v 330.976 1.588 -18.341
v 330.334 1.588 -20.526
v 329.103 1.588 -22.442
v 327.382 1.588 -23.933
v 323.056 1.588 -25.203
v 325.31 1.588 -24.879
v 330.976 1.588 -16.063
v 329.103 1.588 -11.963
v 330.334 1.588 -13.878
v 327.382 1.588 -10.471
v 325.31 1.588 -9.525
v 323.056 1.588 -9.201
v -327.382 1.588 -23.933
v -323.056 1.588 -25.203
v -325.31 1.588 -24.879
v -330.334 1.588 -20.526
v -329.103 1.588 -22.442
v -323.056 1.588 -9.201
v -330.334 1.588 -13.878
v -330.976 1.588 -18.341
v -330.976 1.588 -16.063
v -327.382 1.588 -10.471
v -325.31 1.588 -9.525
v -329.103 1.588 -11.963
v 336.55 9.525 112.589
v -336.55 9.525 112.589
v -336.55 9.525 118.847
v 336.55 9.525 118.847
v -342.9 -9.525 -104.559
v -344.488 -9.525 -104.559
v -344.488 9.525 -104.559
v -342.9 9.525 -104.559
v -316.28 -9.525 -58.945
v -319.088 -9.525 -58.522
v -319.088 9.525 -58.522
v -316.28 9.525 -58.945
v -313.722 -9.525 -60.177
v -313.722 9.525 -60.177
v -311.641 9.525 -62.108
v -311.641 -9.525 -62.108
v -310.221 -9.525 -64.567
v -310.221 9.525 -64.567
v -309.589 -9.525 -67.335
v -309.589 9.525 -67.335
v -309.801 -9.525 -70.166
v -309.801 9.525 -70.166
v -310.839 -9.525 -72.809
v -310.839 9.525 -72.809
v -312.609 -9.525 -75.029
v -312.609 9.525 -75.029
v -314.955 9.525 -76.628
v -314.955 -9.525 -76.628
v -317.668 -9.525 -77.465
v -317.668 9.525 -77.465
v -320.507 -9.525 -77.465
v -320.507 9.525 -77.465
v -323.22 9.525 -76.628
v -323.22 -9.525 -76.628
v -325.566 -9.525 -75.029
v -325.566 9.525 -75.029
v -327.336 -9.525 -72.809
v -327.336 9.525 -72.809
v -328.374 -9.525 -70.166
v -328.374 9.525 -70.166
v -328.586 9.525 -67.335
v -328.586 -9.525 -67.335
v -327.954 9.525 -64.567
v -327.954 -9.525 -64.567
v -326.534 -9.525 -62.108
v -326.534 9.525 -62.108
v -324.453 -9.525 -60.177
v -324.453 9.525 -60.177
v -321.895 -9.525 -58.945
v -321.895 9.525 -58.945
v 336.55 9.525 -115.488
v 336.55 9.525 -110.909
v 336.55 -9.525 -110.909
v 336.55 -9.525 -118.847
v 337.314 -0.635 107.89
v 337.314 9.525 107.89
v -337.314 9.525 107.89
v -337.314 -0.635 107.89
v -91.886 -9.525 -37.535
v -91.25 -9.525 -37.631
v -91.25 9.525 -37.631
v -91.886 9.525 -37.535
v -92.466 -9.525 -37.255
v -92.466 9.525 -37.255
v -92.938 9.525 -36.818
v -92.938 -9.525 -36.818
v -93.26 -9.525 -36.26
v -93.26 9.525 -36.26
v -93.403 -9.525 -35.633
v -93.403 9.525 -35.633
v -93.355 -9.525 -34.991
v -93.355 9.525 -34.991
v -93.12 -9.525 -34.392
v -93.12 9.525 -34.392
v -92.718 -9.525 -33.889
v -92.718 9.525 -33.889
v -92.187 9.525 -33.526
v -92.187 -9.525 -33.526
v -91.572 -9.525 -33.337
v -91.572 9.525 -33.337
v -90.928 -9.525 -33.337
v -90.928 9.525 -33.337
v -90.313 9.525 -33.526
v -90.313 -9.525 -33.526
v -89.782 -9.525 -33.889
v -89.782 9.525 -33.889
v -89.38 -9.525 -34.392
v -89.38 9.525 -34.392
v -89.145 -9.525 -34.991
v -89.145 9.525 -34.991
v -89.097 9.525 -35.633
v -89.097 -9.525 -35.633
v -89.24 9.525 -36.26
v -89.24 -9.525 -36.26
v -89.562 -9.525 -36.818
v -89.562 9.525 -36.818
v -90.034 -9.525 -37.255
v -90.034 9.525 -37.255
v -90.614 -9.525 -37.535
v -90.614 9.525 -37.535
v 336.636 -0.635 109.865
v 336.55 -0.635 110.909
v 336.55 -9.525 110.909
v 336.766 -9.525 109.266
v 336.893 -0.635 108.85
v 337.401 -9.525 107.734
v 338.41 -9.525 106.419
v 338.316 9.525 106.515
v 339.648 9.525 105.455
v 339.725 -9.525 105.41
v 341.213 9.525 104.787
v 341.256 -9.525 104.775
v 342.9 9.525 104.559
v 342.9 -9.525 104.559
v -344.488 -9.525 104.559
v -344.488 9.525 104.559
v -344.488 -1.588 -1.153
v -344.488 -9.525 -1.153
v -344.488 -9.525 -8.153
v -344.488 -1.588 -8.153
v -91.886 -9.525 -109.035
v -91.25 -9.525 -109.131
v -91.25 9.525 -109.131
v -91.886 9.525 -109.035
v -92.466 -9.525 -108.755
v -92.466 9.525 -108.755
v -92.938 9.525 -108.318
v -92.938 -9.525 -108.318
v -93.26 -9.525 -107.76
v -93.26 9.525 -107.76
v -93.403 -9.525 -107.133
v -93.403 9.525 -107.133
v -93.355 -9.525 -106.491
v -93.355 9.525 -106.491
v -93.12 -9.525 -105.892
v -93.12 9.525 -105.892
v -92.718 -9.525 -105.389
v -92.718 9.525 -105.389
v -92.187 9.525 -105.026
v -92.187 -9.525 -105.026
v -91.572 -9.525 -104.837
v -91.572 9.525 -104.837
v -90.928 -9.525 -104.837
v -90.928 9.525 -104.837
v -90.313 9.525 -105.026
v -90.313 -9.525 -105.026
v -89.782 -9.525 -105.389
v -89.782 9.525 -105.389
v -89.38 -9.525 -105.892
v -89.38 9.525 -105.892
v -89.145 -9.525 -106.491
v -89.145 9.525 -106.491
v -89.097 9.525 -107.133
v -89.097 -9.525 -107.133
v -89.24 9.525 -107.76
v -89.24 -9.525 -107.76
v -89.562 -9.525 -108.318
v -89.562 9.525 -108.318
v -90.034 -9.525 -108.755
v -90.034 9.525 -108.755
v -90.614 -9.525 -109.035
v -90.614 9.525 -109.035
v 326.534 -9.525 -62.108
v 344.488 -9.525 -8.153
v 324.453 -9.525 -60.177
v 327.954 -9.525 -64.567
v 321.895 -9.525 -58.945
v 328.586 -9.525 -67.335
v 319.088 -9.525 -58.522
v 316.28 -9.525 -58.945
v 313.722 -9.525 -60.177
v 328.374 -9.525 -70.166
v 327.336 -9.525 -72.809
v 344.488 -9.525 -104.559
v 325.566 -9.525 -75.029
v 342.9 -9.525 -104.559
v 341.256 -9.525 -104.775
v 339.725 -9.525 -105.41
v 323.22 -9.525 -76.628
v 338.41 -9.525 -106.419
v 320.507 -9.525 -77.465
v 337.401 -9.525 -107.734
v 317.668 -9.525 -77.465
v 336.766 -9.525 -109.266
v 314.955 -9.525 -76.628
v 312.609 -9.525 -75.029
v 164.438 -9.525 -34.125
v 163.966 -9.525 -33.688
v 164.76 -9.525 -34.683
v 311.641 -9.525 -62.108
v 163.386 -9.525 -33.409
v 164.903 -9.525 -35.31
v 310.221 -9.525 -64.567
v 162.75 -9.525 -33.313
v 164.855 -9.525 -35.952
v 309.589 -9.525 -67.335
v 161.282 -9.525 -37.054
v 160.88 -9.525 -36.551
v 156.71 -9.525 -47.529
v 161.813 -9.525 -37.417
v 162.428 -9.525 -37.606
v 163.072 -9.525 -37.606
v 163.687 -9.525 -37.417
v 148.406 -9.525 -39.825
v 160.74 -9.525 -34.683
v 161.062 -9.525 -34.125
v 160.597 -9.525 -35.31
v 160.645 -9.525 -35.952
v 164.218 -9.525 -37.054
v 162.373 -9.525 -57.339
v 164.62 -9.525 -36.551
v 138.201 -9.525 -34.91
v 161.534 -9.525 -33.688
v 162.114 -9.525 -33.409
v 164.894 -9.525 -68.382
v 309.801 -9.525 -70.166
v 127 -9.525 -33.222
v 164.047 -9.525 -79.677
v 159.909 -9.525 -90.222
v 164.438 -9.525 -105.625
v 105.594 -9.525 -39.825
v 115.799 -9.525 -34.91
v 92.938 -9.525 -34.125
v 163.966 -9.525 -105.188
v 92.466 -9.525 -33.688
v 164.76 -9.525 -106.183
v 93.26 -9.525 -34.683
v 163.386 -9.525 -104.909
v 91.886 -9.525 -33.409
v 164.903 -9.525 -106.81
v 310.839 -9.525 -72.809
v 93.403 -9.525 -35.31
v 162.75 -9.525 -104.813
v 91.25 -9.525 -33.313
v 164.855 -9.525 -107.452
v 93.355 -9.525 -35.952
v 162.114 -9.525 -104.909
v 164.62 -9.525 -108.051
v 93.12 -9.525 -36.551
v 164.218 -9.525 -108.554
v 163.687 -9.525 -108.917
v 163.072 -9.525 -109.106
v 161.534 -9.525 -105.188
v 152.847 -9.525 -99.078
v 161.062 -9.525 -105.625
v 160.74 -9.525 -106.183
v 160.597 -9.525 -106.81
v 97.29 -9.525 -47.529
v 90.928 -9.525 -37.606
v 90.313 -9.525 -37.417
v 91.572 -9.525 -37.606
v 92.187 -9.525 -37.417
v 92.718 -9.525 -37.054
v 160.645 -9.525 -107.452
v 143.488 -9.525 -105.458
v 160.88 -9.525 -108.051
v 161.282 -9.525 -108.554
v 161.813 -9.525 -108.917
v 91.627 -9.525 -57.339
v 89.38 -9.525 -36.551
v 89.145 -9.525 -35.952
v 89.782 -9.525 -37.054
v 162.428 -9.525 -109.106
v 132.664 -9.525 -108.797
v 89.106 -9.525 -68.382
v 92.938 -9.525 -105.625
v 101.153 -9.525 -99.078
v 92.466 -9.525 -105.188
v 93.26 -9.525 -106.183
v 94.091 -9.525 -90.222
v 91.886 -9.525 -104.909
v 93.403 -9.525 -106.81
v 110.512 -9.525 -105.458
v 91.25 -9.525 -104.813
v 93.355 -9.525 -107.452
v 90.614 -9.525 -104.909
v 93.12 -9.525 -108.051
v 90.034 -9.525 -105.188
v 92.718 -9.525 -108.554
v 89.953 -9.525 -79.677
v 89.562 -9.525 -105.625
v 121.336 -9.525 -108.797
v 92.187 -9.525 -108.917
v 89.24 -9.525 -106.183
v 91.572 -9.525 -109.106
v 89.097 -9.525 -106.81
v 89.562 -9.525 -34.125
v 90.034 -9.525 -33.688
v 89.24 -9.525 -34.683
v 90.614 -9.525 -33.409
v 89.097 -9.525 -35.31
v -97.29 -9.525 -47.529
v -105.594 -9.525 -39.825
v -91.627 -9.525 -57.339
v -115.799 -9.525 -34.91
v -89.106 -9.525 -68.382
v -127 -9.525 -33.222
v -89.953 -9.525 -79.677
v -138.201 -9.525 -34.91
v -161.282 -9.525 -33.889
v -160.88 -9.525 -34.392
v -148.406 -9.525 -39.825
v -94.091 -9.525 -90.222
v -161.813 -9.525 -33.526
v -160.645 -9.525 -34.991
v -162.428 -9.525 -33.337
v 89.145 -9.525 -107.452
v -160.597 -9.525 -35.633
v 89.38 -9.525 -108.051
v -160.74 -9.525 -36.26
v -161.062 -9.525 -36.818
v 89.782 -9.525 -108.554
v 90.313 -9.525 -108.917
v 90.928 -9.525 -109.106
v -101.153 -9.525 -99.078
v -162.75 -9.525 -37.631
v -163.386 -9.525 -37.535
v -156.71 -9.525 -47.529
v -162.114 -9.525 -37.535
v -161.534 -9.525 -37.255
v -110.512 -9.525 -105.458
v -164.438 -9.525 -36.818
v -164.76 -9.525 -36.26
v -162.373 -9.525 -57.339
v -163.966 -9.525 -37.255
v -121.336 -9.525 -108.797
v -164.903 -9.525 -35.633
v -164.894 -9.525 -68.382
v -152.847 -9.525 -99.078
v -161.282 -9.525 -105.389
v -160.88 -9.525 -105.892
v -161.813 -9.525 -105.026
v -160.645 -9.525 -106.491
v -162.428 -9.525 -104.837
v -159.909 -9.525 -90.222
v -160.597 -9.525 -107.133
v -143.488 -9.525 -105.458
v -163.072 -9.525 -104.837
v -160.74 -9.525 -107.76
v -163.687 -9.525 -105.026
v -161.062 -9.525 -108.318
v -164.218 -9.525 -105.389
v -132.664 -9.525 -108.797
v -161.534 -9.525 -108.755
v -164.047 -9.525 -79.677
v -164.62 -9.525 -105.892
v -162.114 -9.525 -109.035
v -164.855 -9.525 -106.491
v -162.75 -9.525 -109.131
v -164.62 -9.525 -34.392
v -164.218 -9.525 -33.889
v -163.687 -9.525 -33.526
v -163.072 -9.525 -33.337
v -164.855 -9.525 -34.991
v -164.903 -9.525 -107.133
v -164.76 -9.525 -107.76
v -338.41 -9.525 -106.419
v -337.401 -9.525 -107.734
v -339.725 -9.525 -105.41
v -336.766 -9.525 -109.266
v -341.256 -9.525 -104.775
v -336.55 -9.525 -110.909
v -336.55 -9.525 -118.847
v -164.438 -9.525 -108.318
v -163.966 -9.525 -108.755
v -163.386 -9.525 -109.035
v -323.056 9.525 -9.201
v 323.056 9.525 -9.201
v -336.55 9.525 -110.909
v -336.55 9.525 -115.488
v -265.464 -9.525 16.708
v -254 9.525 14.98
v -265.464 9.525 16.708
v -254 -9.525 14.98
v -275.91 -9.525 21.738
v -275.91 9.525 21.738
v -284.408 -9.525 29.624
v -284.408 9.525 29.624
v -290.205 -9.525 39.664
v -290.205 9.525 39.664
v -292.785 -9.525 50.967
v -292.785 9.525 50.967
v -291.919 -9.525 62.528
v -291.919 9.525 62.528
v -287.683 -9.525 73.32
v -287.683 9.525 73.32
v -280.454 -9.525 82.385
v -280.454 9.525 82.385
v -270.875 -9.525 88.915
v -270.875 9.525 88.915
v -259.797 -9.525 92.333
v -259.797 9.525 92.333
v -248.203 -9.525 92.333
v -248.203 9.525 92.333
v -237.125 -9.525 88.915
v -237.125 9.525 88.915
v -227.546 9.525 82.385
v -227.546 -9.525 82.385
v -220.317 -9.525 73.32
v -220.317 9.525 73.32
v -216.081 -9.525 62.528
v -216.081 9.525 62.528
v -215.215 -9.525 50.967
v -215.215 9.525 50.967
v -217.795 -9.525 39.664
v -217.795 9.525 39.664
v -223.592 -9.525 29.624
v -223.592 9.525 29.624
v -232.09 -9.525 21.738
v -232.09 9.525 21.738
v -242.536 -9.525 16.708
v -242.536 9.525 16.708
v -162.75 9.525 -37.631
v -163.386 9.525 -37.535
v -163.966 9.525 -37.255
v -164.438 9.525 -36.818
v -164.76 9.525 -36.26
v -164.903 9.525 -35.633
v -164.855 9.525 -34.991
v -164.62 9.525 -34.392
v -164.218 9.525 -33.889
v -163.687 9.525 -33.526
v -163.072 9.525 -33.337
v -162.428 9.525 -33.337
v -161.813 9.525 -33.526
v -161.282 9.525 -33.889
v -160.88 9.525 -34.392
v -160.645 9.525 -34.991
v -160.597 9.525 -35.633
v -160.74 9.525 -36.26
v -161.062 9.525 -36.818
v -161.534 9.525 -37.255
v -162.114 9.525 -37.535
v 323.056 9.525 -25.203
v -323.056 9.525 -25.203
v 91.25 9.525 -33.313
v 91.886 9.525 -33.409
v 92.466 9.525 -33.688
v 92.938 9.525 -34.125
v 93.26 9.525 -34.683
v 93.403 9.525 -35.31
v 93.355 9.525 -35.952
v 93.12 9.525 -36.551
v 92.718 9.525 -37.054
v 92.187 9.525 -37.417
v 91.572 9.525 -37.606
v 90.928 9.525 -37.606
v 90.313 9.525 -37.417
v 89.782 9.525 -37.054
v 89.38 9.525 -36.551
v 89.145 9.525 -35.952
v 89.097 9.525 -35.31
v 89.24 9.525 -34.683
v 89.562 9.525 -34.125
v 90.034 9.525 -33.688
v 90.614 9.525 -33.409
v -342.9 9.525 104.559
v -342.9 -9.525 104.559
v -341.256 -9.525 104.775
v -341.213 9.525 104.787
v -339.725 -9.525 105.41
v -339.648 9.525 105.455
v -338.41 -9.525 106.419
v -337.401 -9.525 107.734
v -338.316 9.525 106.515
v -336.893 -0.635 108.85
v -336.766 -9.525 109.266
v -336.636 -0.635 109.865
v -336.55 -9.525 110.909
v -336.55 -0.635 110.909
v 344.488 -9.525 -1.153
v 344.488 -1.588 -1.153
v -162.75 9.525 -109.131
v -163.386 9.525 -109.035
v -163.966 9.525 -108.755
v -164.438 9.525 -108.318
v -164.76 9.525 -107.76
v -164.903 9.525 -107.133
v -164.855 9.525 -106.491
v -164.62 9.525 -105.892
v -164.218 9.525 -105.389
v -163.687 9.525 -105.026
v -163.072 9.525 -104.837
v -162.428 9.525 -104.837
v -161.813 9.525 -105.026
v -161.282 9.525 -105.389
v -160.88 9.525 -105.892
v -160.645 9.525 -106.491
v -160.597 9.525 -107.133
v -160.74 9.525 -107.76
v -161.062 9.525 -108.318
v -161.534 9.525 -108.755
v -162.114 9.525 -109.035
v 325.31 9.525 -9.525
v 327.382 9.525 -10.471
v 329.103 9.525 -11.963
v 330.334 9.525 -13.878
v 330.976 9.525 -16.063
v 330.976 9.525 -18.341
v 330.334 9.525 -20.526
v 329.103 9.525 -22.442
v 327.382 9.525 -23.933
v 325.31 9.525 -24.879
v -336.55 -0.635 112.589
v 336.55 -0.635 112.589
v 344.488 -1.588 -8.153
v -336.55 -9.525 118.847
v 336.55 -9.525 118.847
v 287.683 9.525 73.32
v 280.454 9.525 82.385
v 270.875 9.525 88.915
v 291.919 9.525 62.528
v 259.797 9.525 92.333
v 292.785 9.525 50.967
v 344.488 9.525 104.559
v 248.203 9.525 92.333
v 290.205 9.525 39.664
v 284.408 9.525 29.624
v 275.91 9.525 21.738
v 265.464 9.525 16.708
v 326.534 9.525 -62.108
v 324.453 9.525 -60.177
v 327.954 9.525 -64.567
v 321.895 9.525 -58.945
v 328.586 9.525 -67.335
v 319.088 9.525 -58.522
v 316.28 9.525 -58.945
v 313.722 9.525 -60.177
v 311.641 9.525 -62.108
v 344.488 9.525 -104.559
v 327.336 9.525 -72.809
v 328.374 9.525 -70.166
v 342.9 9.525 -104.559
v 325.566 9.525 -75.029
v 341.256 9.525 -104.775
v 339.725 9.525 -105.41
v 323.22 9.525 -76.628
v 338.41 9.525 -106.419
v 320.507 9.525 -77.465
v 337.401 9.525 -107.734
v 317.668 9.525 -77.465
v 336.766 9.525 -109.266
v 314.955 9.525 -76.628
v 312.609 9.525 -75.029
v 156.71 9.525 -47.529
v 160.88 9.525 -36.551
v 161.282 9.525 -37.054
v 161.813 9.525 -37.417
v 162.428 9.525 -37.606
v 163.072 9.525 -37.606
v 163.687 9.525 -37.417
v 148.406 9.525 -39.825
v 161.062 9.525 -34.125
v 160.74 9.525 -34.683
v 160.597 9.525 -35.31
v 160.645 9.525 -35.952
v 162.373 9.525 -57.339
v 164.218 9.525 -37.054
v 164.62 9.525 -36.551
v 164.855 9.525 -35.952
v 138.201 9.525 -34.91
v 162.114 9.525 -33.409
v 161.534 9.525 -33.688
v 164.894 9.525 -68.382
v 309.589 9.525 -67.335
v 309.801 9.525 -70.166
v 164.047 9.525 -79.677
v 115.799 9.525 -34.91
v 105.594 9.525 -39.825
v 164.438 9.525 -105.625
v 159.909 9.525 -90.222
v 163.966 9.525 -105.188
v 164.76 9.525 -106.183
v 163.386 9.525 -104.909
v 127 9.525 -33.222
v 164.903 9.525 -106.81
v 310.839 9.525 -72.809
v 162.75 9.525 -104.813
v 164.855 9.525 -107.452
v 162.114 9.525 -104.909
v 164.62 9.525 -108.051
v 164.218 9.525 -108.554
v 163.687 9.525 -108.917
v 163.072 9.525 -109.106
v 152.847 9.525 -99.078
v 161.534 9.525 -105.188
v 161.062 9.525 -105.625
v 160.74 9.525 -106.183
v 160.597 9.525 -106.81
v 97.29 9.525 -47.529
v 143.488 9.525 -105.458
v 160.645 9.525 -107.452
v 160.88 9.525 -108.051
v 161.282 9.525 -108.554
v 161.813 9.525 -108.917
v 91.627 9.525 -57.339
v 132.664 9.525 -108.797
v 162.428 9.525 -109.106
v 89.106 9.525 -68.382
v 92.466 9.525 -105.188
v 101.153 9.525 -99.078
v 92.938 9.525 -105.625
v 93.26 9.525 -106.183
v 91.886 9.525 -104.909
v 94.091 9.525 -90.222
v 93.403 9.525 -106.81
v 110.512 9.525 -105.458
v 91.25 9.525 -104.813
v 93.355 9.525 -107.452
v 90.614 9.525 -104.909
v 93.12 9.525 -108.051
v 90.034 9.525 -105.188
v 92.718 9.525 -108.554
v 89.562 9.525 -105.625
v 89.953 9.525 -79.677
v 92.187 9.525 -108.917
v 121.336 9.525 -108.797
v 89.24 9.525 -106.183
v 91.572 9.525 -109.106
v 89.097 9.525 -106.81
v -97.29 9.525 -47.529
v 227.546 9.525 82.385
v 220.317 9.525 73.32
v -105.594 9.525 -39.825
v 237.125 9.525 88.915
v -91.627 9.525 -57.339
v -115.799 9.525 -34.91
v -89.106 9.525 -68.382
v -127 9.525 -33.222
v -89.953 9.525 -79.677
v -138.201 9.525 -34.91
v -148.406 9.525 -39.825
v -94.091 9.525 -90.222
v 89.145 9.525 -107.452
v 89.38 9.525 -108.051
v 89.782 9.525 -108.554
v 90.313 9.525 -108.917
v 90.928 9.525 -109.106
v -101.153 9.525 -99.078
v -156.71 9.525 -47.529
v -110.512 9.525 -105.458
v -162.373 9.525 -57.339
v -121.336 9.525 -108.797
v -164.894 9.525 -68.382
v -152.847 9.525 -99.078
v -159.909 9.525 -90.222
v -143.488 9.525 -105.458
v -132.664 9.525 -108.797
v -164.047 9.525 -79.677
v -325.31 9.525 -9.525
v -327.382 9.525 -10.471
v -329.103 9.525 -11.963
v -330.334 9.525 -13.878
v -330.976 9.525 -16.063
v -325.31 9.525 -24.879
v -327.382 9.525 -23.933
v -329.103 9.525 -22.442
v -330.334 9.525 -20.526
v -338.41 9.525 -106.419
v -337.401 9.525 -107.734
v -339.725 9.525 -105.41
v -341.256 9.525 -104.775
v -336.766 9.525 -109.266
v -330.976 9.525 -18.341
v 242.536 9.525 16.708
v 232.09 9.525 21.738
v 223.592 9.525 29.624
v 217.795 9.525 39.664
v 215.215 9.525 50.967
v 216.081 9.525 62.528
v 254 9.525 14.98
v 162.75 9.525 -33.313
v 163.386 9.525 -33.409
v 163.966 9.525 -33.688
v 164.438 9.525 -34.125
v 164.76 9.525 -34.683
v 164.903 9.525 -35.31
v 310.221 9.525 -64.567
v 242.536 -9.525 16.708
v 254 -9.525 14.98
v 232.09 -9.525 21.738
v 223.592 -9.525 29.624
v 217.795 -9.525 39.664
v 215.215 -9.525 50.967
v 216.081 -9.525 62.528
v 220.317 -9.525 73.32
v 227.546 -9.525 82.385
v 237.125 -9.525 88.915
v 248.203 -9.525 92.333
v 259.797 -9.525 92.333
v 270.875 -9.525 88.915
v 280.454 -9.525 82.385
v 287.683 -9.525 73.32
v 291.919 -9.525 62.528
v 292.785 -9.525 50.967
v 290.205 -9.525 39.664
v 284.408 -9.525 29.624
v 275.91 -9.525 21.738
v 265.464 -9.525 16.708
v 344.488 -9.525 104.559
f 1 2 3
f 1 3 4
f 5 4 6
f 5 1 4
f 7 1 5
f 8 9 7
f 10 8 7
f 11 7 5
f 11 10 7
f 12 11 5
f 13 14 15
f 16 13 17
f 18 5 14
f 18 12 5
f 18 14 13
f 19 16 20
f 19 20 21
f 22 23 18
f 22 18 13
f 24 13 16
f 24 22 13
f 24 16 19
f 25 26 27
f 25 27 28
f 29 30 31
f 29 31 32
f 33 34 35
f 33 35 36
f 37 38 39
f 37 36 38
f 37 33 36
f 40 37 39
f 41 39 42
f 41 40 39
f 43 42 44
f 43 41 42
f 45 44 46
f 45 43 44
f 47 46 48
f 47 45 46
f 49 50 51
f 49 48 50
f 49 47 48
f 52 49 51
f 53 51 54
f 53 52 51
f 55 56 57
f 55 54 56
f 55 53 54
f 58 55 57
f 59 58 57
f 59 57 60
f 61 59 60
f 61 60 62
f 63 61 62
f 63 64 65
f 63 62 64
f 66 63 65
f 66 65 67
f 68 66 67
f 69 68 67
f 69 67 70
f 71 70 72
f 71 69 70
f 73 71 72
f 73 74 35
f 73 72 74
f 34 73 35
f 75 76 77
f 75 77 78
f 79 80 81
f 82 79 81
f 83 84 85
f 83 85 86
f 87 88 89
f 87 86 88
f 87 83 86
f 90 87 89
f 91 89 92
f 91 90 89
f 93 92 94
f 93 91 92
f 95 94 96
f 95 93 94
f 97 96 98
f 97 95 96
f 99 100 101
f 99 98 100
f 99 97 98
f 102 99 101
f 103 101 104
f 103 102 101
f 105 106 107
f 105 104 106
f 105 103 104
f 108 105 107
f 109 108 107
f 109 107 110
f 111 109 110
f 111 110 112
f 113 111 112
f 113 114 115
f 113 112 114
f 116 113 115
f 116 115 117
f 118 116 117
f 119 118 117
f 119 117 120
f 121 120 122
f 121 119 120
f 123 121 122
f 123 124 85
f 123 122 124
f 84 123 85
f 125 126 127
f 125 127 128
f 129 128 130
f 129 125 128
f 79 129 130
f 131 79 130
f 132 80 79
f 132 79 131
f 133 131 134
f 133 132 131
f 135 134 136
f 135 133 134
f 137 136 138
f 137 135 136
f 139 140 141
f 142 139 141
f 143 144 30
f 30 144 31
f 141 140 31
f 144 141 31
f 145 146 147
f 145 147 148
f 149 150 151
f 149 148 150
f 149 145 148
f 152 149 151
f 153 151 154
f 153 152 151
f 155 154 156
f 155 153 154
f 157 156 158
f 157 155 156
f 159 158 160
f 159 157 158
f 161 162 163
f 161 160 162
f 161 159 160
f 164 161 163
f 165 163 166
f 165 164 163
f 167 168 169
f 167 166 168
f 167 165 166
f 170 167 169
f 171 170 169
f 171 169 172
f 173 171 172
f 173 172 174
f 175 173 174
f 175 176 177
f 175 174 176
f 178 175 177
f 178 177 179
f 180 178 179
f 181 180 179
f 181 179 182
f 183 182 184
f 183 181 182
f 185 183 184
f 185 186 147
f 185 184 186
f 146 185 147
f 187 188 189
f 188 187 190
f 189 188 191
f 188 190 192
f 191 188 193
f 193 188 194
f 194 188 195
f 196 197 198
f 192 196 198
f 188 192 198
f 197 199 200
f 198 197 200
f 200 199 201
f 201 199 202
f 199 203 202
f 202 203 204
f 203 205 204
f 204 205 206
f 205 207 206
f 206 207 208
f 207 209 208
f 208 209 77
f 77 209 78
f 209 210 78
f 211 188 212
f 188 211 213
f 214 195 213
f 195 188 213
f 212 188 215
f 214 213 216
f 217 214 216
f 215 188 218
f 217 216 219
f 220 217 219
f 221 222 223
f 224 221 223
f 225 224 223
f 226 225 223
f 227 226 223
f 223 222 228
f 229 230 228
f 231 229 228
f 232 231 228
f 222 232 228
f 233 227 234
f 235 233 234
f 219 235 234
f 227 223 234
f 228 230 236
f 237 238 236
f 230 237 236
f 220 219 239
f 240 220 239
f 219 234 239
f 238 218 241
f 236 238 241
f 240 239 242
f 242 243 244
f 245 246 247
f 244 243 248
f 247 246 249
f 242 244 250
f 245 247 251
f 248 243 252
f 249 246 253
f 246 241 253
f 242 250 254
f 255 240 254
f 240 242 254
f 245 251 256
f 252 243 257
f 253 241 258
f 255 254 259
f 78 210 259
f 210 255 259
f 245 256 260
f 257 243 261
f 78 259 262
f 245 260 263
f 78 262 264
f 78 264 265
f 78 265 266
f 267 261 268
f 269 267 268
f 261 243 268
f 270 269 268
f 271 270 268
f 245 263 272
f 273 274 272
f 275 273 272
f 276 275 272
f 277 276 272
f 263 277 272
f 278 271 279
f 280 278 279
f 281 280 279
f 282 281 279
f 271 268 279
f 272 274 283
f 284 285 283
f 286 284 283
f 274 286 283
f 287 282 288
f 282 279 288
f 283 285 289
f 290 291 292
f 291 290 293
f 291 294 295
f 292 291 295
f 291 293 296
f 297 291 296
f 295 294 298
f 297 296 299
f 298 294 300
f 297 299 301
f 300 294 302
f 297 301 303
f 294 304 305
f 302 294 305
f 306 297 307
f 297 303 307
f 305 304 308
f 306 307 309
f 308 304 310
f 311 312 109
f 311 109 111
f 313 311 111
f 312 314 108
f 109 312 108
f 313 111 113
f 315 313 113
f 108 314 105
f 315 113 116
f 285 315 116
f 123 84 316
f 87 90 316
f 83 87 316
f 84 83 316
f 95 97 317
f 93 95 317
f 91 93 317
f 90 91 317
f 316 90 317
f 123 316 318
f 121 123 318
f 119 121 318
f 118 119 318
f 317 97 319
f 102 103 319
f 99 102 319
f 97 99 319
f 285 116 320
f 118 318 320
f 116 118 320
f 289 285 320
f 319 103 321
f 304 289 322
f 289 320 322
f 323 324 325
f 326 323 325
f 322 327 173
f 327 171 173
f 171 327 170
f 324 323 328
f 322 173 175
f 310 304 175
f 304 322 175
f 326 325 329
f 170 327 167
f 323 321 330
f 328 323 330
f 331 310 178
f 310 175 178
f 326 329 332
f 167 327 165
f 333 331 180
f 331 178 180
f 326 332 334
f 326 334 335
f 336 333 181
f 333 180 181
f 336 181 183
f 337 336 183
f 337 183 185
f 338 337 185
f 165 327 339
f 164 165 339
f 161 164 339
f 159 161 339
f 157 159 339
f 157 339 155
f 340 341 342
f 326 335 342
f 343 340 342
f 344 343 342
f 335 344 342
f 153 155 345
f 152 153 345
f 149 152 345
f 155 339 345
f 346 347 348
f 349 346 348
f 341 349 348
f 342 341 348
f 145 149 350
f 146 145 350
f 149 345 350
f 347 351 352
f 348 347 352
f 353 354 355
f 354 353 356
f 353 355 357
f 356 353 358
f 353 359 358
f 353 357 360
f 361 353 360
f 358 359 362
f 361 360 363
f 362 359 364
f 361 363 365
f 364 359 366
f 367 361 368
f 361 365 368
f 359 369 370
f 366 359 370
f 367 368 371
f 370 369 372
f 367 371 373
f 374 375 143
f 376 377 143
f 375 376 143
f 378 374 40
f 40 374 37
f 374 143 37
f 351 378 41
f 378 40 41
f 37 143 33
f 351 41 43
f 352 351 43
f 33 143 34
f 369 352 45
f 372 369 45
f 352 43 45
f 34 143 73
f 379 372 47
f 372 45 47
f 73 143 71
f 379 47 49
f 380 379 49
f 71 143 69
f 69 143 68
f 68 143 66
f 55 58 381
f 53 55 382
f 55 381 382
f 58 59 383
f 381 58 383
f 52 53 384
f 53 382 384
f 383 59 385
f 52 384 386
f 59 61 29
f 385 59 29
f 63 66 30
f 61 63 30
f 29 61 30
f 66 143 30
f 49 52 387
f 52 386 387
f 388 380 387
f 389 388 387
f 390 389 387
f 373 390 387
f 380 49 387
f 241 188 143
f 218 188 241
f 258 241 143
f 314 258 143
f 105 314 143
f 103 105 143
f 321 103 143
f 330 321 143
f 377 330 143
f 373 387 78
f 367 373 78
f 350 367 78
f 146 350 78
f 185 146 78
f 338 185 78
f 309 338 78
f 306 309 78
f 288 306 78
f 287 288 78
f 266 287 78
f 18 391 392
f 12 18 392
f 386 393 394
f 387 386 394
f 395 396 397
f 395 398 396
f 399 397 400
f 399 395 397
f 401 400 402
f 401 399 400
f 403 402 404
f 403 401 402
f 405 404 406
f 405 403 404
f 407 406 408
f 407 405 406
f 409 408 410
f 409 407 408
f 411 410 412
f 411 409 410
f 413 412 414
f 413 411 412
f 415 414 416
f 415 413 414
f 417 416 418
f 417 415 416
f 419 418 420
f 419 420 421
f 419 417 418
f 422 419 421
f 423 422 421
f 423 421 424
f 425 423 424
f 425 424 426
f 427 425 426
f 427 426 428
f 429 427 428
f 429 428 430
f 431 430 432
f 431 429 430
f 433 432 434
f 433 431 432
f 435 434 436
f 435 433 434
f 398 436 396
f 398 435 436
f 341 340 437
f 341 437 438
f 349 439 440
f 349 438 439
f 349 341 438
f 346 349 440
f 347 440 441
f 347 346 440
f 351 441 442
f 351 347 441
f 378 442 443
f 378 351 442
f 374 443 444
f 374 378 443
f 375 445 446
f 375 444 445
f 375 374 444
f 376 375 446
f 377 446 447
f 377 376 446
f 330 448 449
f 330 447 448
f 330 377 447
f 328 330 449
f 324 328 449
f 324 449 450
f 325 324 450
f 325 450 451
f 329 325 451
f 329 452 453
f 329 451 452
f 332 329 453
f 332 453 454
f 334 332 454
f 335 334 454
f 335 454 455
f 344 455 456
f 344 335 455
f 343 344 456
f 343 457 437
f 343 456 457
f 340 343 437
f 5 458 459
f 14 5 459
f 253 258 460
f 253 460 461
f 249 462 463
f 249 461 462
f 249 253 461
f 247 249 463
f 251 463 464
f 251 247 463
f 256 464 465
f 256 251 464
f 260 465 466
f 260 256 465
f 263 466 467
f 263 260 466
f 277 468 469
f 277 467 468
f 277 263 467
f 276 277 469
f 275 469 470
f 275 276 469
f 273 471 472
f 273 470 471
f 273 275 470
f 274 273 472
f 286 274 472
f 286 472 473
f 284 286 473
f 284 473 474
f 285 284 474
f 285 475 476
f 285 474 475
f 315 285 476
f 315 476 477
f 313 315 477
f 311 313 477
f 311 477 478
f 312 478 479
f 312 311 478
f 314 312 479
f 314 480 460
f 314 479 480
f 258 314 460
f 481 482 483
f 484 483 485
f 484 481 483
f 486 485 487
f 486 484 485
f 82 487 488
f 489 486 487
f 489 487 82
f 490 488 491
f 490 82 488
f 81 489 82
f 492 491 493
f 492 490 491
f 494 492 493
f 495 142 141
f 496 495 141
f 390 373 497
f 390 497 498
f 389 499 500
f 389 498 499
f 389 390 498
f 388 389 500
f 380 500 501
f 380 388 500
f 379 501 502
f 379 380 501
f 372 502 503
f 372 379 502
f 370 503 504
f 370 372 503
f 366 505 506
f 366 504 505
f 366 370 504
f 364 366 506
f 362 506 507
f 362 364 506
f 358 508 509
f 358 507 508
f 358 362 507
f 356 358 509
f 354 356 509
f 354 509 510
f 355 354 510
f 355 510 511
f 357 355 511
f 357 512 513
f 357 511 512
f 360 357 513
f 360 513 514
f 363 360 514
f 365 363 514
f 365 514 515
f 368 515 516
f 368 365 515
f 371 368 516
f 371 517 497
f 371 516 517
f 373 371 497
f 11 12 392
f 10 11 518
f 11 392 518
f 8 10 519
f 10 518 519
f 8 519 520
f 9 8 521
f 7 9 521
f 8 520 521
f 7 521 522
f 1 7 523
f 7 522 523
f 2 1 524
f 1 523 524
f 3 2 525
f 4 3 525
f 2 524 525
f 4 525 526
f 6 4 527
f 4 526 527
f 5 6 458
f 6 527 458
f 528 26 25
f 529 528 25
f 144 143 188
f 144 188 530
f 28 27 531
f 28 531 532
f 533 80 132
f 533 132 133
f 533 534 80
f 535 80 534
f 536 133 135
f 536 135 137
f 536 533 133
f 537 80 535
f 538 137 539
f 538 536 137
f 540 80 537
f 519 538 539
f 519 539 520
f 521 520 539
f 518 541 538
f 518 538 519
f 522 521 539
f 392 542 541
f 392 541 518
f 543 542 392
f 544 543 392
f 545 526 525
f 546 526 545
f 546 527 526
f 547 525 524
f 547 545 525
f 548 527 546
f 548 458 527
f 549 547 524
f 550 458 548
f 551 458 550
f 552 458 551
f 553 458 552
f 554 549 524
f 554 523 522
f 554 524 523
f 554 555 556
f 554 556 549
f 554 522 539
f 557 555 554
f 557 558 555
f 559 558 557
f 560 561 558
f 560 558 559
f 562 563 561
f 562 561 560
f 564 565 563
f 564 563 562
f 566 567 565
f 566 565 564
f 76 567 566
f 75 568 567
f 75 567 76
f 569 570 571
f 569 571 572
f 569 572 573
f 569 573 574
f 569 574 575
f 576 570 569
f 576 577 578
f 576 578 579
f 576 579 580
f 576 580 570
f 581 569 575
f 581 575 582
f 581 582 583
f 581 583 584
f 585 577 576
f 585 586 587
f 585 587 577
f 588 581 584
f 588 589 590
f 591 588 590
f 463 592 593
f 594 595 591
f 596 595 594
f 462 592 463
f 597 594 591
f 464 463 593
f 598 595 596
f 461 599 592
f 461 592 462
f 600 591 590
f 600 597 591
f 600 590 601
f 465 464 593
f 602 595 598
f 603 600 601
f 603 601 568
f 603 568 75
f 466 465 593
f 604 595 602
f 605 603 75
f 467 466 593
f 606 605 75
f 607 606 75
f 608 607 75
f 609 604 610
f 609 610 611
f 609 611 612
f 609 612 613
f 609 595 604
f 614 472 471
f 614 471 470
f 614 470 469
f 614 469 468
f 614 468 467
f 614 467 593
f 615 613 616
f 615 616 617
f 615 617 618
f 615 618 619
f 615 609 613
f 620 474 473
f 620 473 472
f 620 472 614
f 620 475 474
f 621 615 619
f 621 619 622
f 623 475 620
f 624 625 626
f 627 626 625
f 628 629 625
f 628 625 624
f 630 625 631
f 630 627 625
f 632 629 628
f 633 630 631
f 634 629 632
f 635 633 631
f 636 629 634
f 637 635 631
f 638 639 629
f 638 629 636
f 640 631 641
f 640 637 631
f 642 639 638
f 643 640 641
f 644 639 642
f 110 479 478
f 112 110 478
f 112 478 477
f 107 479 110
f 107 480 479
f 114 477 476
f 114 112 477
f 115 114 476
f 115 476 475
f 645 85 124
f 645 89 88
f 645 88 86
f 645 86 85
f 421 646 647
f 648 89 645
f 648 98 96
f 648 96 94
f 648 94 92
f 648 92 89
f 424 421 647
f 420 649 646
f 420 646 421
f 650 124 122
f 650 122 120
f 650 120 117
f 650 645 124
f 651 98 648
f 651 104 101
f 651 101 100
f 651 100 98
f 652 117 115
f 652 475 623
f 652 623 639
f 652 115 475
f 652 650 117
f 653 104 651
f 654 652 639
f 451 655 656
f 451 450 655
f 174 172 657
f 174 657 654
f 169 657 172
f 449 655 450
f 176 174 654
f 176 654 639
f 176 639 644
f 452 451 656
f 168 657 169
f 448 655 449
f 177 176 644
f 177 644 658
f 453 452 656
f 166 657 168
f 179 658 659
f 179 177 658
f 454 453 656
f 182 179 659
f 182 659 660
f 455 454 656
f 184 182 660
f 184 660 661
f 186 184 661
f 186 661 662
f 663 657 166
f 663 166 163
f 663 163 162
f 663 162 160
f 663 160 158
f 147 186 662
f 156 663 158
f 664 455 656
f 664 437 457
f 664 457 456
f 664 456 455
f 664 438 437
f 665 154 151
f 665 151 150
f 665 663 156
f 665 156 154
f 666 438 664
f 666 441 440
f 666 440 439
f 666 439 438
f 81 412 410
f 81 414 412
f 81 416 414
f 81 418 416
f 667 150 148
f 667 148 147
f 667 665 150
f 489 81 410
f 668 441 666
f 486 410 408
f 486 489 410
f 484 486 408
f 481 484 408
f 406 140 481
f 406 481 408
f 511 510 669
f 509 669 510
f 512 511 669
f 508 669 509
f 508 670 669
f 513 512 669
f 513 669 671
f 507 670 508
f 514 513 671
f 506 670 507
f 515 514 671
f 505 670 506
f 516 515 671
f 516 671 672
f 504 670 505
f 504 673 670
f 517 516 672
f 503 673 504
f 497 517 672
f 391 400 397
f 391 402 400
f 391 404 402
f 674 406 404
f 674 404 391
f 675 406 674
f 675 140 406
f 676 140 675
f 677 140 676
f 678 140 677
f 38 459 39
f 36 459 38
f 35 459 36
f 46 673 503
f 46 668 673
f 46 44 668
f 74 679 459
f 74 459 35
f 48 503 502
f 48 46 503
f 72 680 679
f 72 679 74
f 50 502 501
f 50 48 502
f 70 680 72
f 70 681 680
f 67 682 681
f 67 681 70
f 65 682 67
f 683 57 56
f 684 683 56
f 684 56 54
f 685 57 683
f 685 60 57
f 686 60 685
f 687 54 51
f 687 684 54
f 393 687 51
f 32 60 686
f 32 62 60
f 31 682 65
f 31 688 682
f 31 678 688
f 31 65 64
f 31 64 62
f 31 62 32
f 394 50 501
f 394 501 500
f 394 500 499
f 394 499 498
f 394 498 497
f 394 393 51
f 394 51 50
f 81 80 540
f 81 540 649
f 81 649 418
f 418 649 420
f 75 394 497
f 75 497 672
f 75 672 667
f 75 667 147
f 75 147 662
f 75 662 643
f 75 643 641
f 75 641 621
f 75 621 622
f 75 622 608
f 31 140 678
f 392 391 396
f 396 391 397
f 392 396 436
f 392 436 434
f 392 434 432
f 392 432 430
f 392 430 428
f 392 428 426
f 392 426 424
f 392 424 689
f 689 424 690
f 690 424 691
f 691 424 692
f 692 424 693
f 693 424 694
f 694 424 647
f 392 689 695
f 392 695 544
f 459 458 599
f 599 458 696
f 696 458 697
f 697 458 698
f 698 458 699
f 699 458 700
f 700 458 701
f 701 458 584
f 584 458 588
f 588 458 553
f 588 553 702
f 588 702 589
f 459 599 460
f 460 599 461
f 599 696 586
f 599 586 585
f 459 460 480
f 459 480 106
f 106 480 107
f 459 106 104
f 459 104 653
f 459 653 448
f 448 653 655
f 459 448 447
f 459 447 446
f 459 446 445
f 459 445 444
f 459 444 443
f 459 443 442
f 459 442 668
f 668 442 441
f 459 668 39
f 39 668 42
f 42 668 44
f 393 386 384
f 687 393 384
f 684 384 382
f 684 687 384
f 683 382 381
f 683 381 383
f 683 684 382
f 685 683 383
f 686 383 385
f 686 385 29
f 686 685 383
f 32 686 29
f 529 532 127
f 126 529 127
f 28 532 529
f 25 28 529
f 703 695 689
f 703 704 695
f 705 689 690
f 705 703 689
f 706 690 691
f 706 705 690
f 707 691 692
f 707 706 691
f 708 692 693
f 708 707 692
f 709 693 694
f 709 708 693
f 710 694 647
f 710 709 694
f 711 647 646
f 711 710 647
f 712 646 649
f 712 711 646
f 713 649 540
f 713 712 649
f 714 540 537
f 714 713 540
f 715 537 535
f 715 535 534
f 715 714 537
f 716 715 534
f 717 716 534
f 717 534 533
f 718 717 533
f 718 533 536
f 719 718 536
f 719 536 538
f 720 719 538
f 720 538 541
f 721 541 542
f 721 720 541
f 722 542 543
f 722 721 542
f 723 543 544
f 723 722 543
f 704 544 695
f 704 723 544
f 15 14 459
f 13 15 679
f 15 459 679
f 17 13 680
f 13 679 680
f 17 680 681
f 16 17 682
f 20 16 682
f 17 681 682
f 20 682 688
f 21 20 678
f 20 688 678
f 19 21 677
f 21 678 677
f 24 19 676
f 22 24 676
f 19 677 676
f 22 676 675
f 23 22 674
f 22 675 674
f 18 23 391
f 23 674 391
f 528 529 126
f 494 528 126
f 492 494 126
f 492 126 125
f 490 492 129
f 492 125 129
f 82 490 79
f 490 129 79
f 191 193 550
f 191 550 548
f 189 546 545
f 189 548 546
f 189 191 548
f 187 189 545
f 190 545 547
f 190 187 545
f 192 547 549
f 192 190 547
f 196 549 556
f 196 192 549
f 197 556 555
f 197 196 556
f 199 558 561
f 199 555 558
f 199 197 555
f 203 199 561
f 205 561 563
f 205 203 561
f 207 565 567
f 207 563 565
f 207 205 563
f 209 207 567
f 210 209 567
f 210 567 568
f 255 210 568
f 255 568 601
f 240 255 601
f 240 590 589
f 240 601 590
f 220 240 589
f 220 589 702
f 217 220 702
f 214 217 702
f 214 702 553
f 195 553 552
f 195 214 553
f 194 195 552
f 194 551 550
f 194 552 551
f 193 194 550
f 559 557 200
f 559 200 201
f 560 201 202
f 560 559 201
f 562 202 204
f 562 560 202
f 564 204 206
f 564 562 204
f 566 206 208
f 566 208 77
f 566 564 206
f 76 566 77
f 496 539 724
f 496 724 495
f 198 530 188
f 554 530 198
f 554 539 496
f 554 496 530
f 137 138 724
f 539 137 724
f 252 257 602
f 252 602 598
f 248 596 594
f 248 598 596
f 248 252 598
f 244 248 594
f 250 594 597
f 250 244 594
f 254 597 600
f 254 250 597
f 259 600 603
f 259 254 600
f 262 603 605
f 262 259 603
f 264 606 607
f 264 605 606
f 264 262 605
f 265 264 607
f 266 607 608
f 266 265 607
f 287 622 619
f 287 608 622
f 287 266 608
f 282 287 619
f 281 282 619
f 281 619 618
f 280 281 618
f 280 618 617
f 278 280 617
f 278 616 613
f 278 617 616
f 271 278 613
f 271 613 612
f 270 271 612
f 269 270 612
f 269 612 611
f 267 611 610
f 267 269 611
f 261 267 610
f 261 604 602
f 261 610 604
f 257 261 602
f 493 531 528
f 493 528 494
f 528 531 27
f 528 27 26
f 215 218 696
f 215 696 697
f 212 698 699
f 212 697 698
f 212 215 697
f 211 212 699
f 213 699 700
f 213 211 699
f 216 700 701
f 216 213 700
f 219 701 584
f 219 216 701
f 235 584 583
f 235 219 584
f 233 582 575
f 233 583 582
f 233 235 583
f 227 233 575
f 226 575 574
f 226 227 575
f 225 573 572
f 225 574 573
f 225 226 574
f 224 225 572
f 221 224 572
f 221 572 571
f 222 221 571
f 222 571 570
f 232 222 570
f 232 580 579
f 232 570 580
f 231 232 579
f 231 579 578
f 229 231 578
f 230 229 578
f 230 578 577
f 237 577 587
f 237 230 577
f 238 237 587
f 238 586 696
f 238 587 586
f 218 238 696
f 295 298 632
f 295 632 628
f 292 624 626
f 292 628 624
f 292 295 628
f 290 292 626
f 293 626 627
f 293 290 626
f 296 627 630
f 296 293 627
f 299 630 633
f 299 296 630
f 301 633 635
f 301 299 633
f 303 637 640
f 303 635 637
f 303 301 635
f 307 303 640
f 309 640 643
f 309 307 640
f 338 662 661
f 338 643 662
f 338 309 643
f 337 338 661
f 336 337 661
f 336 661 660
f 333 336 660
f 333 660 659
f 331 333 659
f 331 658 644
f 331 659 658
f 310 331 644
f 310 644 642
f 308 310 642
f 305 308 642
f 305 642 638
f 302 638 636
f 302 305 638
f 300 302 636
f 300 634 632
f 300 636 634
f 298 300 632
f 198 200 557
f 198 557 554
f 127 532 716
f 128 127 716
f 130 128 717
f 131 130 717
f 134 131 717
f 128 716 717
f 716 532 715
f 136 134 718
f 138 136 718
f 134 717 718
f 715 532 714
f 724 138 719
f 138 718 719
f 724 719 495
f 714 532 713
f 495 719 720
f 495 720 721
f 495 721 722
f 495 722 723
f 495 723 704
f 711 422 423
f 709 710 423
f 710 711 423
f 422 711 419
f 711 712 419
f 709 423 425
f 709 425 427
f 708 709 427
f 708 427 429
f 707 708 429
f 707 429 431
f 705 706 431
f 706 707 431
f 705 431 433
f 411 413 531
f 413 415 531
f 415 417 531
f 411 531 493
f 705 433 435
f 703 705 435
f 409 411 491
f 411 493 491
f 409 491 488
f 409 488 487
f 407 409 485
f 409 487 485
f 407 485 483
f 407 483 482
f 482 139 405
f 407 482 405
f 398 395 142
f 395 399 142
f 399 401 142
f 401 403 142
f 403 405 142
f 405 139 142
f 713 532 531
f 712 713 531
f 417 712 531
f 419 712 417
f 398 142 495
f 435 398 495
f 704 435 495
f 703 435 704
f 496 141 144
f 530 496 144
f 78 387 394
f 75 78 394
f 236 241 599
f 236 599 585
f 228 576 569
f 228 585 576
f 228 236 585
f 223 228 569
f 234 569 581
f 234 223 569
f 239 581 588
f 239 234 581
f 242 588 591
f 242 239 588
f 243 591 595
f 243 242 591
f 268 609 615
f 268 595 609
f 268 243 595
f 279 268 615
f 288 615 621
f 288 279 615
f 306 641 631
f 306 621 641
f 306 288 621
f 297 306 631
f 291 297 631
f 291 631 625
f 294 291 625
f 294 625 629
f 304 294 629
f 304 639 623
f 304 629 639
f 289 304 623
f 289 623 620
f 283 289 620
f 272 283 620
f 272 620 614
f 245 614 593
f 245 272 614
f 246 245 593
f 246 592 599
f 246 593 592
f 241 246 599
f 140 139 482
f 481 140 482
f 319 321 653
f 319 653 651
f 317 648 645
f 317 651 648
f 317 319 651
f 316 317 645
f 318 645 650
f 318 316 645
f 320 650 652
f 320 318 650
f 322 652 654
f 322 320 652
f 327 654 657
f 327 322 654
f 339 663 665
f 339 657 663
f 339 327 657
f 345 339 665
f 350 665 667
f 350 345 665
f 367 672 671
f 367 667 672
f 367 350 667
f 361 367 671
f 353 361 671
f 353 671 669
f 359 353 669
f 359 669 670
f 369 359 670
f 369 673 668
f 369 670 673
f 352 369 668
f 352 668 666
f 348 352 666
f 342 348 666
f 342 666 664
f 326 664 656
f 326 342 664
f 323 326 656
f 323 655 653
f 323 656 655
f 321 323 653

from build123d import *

# Parameters (mm, degrees)
SKETCH1_W               = 673.1
SKETCH1_H               = 237.6932
SKETCH1_R               = 38.89375
BOSS_EXTRUDE1_DEPTH     = 9.525
SKETCH2_W               = 673.1
SKETCH2_H               = 4.699
CUT_EXTRUDE1_DEPTH      = 10.16
SKETCH3_W               = 7.9375
SKETCH3_H               = 209.1182
BOSS_EXTRUDE2_DEPTH     = 19.05
FILLET1_R               = 6.35
CUT_EXTRUDE2_DEPTH      = 692.395195502
CUT_EXTRUDE2_DEPTH_BACK = 692.395195502
CUT_EXTRUDE3_START      = -19.05
CUT_EXTRUDE3_DEPTH      = 7.9375
CUT_EXTRUDE4_DEPTH      = 365.9096525
CUT_EXTRUDE4_DEPTH_BACK = 365.9096525
SKETCH6_R               = 9.525
SKETCH6_R_2             = 38
SKETCH6_R_3             = 2.159
CUT_EXTRUDE5_DEPTH      = 365.536524388
CUT_EXTRUDE5_DEPTH_BACK = 365.536524388
SKETCH8_W               = 7
SKETCH8_H               = 7.9375


with BuildPart() as part:
    # Sketch1 → Boss-Extrude1 (new, symmetric)
    with BuildSketch(Plane(origin=(0, 0, 0), x_dir=(1, 0, 0), z_dir=(0, 1, 0))):
        Rectangle(SKETCH1_W, SKETCH1_H)
        with Locations(Location((-254, -53.8734, 0), (0, 0, 90))):
            Circle(SKETCH1_R, mode=Mode.SUBTRACT)
        with Locations(Location((254, -53.8734, 0), (0, 0, 90))):
            Circle(SKETCH1_R, mode=Mode.SUBTRACT)
    extrude(amount=BOSS_EXTRUDE1_DEPTH, both=True)

    # Sketch2 → Cut-Extrude1 (cut)
    with BuildSketch(Plane(origin=(0, 9.525, 0), x_dir=(1, 0, 0), z_dir=(0, 1, 0))):
        with Locations((0, -110.2395052)):
            Rectangle(SKETCH2_W, SKETCH2_H)
    extrude(amount=-CUT_EXTRUDE1_DEPTH, mode=Mode.SUBTRACT)

    # Sketch3 → Boss-Extrude2 (add)
    with BuildSketch(Plane(origin=(0, 9.525, 0), x_dir=(1, 0, 0), z_dir=(0, 1, 0))):
        with Locations((-340.51875, 0)):
            Rectangle(SKETCH3_W, SKETCH3_H)
        with Locations((340.51875, 0)):
            Rectangle(SKETCH3_W, SKETCH3_H)
    extrude(amount=-BOSS_EXTRUDE2_DEPTH)

    # Fillet1
    # the kernel refuses this fillet: 6.35 mm, written as the material it adds along each edge
    with BuildSketch(Plane(origin=(336.55, 9.525, -104.5591), x_dir=(0, 0, -1), z_dir=(0, -1, 0))) as fillet1_piece_1:
        with BuildLine():
            CenterArc((FILLET1_R, FILLET1_R), FILLET1_R, 180, 90)
            Line((0, FILLET1_R), (0, 0))
            Line((0, 0), (FILLET1_R, 0))
        make_face()
    extrude(amount=19.05)
    with BuildSketch(Plane(origin=(336.55, 9.525, 104.5591), x_dir=(0, 0, 1), z_dir=(0, -1, 0))) as fillet1_piece_2_section:
        with BuildLine():
            CenterArc((FILLET1_R, -FILLET1_R), FILLET1_R, 90, 90)
            Line((0, -FILLET1_R), (0, 0))
            Line((0, 0), (FILLET1_R, 0))
        make_face()
    fillet1_piece_2 = extrude(amount=19.05, mode=Mode.PRIVATE)
    fillet1_piece_2 = split(fillet1_piece_2, bisect_by=Plane(origin=(338.149651187, -0.635, 105.638113303), z_dir=(0, 1, 0)), keep=Keep.TOP, mode=Mode.PRIVATE)
    fillet1_piece_2 = split(fillet1_piece_2, bisect_by=Plane(origin=(338.149651187, 4.445, 107.8900052), z_dir=(0, 0, -1)), keep=Keep.TOP, mode=Mode.PRIVATE)
    add(fillet1_piece_2)
    with BuildSketch(Plane(origin=(336.55, 9.525, 104.5591), x_dir=(0, 0, 1), z_dir=(0, -1, 0))) as fillet1_piece_3_section:
        with BuildLine():
            CenterArc((FILLET1_R, -FILLET1_R), FILLET1_R, 90, 90)
            Line((0, -FILLET1_R), (0, 0))
            Line((0, 0), (FILLET1_R, 0))
        make_face()
    fillet1_piece_3 = extrude(amount=19.05, mode=Mode.PRIVATE)
    fillet1_piece_3 = split(fillet1_piece_3, bisect_by=Plane(origin=(336.678320254, -0.635, 108.894134697), z_dir=(0, -1, 0)), keep=Keep.TOP, mode=Mode.PRIVATE)
    fillet1_piece_3 = split(fillet1_piece_3, bisect_by=Plane(origin=(336.678320254, -5.08, 107.8900052), z_dir=(0, 0, 1)), keep=Keep.TOP, mode=Mode.PRIVATE)
    add(fillet1_piece_3)
    with BuildSketch(Plane(origin=(336.55, 9.525, 104.5591), x_dir=(0, 0, 1), z_dir=(0, -1, 0))) as fillet1_piece_4_section:
        with BuildLine():
            CenterArc((FILLET1_R, -FILLET1_R), FILLET1_R, 90, 90)
            Line((0, -FILLET1_R), (0, 0))
            Line((0, 0), (FILLET1_R, 0))
        make_face()
    fillet1_piece_4 = extrude(amount=19.05, mode=Mode.PRIVATE)
    fillet1_piece_4 = split(fillet1_piece_4, bisect_by=Plane(origin=(338.149651187, -0.635, 105.638113303), z_dir=(0, -1, 0)), keep=Keep.TOP, mode=Mode.PRIVATE)
    fillet1_piece_4 = split(fillet1_piece_4, bisect_by=Plane(origin=(338.149651187, -5.08, 107.8900052), z_dir=(0, 0, -1)), keep=Keep.TOP, mode=Mode.PRIVATE)
    add(fillet1_piece_4)
    with BuildSketch(Plane(origin=(-336.55, 9.525, -104.5591), x_dir=(0, 0, -1), z_dir=(0, -1, 0))) as fillet1_piece_5:
        with BuildLine():
            CenterArc((FILLET1_R, -FILLET1_R), FILLET1_R, 90, 90)
            Line((0, -FILLET1_R), (0, 0))
            Line((0, 0), (FILLET1_R, 0))
        make_face()
    extrude(amount=19.05)
    with BuildSketch(Plane(origin=(-336.55, 9.525, 104.5591), x_dir=(0, 0, 1), z_dir=(0, -1, 0))) as fillet1_piece_6_section:
        with BuildLine():
            CenterArc((FILLET1_R, FILLET1_R), FILLET1_R, 180, 90)
            Line((0, FILLET1_R), (0, 0))
            Line((0, 0), (FILLET1_R, 0))
        make_face()
    fillet1_piece_6 = extrude(amount=19.05, mode=Mode.PRIVATE)
    fillet1_piece_6 = split(fillet1_piece_6, bisect_by=Plane(origin=(-338.149651187, 4.445, 107.8900052), z_dir=(0, 0, -1)), keep=Keep.TOP, mode=Mode.PRIVATE)
    fillet1_piece_6 = split(fillet1_piece_6, bisect_by=Plane(origin=(-338.149651187, -0.635, 105.638113303), z_dir=(0, 1, 0)), keep=Keep.TOP, mode=Mode.PRIVATE)
    add(fillet1_piece_6)
    with BuildSketch(Plane(origin=(-336.55, 9.525, 104.5591), x_dir=(0, 0, 1), z_dir=(0, -1, 0))) as fillet1_piece_7_section:
        with BuildLine():
            CenterArc((FILLET1_R, FILLET1_R), FILLET1_R, 180, 90)
            Line((0, FILLET1_R), (0, 0))
            Line((0, 0), (FILLET1_R, 0))
        make_face()
    fillet1_piece_7 = extrude(amount=19.05, mode=Mode.PRIVATE)
    fillet1_piece_7 = split(fillet1_piece_7, bisect_by=Plane(origin=(-336.678320254, -5.08, 107.8900052), z_dir=(0, 0, 1)), keep=Keep.TOP, mode=Mode.PRIVATE)
    fillet1_piece_7 = split(fillet1_piece_7, bisect_by=Plane(origin=(-336.678320254, -0.635, 108.894134697), z_dir=(0, -1, 0)), keep=Keep.TOP, mode=Mode.PRIVATE)
    add(fillet1_piece_7)
    with BuildSketch(Plane(origin=(-336.55, 9.525, 104.5591), x_dir=(0, 0, 1), z_dir=(0, -1, 0))) as fillet1_piece_8_section:
        with BuildLine():
            CenterArc((FILLET1_R, FILLET1_R), FILLET1_R, 180, 90)
            Line((0, FILLET1_R), (0, 0))
            Line((0, 0), (FILLET1_R, 0))
        make_face()
    fillet1_piece_8 = extrude(amount=19.05, mode=Mode.PRIVATE)
    fillet1_piece_8 = split(fillet1_piece_8, bisect_by=Plane(origin=(-338.149651187, -5.08, 107.8900052), z_dir=(0, 0, -1)), keep=Keep.TOP, mode=Mode.PRIVATE)
    fillet1_piece_8 = split(fillet1_piece_8, bisect_by=Plane(origin=(-338.149651187, -0.635, 105.638113303), z_dir=(0, -1, 0)), keep=Keep.TOP, mode=Mode.PRIVATE)
    add(fillet1_piece_8)

    # Sketch4 → Cut-Extrude2 (cut, two sides: drawn at the far end of the back side and taken through both)
    with BuildSketch(Plane(origin=(336.55, 0, 0), x_dir=(0, 0, -1), z_dir=(1, 0, 0)).offset(-CUT_EXTRUDE2_DEPTH_BACK)):
        Polygon((118.8466, -9.525), (115.487571018, 9.525), (118.8466, 9.525), align=None)
    extrude(amount=CUT_EXTRUDE2_DEPTH + CUT_EXTRUDE2_DEPTH_BACK, mode=Mode.SUBTRACT)

    # Sketch5 → Cut-Extrude3 (cut)
    with BuildSketch(Plane.XZ.offset(9.525).offset(CUT_EXTRUDE3_START)):
        with BuildLine():
            Line((-323.05625, -9.201160668), (323.05625, -9.201160668))
            ThreePointArc((323.05625, -9.201160668), (331.05725, -17.202160668), (323.05625, -25.203160668))
            Line((323.05625, -25.203160668), (-323.05625, -25.203160668))
            ThreePointArc((-323.05625, -25.203160668), (-331.05725, -17.202160668), (-323.05625, -9.201160668))
        make_face()
    extrude(amount=CUT_EXTRUDE3_DEPTH, mode=Mode.SUBTRACT)

    # Sketch6 → Cut-Extrude4 (cut, two sides: drawn at the far end of the back side and taken through both)
    with BuildSketch(Plane(origin=(0, 9.525, 0), x_dir=(1, 0, 0), z_dir=(0, 1, 0)).offset(-CUT_EXTRUDE4_DEPTH_BACK)):
        with Locations(Location((-319.0875, 68.0466, 0), (0, 0, 270))):
            Circle(SKETCH6_R)
        with Locations(Location((319.0875, 68.0466, 0), (0, 0, 270))):
            Circle(SKETCH6_R)
        with Locations(Location((127, 71.2216, 0), (0, 0, 270))):
            Circle(SKETCH6_R_2)
        with Locations(Location((-127, 71.2216, 0), (0, 0, 270))):
            Circle(SKETCH6_R_2)
        with Locations(Location((162.75, 106.9716, 0), (0, 0, 270))):
            Circle(SKETCH6_R_3)
        with Locations(Location((162.75, 35.4716, 0), (0, 0, 270))):
            Circle(SKETCH6_R_3)
        with Locations(Location((91.25, 35.4716, 0), (0, 0, 270))):
            Circle(SKETCH6_R_3)
        with Locations(Location((91.25, 106.9716, 0), (0, 0, 270))):
            Circle(SKETCH6_R_3)
        with Locations(Location((-91.25, 106.9716, 0), (0, 0, 90))):
            Circle(SKETCH6_R_3)
        with Locations(Location((-91.25, 35.4716, 0), (0, 0, 90))):
            Circle(SKETCH6_R_3)
        with Locations(Location((-162.75, 35.4716, 0), (0, 0, 90))):
            Circle(SKETCH6_R_3)
        with Locations(Location((-162.75, 106.9716, 0), (0, 0, 90))):
            Circle(SKETCH6_R_3)
    extrude(amount=CUT_EXTRUDE4_DEPTH + CUT_EXTRUDE4_DEPTH_BACK, mode=Mode.SUBTRACT)

    # Sketch8 → Cut-Extrude5 (cut, two sides: drawn at the far end of the back side and taken through both)
    with BuildSketch(Plane(origin=(0, 0, 0), x_dir=(0, 0, -1), z_dir=(1, 0, 0)).offset(-CUT_EXTRUDE5_DEPTH_BACK)):
        with Locations((4.6533886, -5.55625)):
            Rectangle(SKETCH8_W, SKETCH8_H)
    extrude(amount=CUT_EXTRUDE5_DEPTH + CUT_EXTRUDE5_DEPTH_BACK, mode=Mode.SUBTRACT)


solid = part.part
